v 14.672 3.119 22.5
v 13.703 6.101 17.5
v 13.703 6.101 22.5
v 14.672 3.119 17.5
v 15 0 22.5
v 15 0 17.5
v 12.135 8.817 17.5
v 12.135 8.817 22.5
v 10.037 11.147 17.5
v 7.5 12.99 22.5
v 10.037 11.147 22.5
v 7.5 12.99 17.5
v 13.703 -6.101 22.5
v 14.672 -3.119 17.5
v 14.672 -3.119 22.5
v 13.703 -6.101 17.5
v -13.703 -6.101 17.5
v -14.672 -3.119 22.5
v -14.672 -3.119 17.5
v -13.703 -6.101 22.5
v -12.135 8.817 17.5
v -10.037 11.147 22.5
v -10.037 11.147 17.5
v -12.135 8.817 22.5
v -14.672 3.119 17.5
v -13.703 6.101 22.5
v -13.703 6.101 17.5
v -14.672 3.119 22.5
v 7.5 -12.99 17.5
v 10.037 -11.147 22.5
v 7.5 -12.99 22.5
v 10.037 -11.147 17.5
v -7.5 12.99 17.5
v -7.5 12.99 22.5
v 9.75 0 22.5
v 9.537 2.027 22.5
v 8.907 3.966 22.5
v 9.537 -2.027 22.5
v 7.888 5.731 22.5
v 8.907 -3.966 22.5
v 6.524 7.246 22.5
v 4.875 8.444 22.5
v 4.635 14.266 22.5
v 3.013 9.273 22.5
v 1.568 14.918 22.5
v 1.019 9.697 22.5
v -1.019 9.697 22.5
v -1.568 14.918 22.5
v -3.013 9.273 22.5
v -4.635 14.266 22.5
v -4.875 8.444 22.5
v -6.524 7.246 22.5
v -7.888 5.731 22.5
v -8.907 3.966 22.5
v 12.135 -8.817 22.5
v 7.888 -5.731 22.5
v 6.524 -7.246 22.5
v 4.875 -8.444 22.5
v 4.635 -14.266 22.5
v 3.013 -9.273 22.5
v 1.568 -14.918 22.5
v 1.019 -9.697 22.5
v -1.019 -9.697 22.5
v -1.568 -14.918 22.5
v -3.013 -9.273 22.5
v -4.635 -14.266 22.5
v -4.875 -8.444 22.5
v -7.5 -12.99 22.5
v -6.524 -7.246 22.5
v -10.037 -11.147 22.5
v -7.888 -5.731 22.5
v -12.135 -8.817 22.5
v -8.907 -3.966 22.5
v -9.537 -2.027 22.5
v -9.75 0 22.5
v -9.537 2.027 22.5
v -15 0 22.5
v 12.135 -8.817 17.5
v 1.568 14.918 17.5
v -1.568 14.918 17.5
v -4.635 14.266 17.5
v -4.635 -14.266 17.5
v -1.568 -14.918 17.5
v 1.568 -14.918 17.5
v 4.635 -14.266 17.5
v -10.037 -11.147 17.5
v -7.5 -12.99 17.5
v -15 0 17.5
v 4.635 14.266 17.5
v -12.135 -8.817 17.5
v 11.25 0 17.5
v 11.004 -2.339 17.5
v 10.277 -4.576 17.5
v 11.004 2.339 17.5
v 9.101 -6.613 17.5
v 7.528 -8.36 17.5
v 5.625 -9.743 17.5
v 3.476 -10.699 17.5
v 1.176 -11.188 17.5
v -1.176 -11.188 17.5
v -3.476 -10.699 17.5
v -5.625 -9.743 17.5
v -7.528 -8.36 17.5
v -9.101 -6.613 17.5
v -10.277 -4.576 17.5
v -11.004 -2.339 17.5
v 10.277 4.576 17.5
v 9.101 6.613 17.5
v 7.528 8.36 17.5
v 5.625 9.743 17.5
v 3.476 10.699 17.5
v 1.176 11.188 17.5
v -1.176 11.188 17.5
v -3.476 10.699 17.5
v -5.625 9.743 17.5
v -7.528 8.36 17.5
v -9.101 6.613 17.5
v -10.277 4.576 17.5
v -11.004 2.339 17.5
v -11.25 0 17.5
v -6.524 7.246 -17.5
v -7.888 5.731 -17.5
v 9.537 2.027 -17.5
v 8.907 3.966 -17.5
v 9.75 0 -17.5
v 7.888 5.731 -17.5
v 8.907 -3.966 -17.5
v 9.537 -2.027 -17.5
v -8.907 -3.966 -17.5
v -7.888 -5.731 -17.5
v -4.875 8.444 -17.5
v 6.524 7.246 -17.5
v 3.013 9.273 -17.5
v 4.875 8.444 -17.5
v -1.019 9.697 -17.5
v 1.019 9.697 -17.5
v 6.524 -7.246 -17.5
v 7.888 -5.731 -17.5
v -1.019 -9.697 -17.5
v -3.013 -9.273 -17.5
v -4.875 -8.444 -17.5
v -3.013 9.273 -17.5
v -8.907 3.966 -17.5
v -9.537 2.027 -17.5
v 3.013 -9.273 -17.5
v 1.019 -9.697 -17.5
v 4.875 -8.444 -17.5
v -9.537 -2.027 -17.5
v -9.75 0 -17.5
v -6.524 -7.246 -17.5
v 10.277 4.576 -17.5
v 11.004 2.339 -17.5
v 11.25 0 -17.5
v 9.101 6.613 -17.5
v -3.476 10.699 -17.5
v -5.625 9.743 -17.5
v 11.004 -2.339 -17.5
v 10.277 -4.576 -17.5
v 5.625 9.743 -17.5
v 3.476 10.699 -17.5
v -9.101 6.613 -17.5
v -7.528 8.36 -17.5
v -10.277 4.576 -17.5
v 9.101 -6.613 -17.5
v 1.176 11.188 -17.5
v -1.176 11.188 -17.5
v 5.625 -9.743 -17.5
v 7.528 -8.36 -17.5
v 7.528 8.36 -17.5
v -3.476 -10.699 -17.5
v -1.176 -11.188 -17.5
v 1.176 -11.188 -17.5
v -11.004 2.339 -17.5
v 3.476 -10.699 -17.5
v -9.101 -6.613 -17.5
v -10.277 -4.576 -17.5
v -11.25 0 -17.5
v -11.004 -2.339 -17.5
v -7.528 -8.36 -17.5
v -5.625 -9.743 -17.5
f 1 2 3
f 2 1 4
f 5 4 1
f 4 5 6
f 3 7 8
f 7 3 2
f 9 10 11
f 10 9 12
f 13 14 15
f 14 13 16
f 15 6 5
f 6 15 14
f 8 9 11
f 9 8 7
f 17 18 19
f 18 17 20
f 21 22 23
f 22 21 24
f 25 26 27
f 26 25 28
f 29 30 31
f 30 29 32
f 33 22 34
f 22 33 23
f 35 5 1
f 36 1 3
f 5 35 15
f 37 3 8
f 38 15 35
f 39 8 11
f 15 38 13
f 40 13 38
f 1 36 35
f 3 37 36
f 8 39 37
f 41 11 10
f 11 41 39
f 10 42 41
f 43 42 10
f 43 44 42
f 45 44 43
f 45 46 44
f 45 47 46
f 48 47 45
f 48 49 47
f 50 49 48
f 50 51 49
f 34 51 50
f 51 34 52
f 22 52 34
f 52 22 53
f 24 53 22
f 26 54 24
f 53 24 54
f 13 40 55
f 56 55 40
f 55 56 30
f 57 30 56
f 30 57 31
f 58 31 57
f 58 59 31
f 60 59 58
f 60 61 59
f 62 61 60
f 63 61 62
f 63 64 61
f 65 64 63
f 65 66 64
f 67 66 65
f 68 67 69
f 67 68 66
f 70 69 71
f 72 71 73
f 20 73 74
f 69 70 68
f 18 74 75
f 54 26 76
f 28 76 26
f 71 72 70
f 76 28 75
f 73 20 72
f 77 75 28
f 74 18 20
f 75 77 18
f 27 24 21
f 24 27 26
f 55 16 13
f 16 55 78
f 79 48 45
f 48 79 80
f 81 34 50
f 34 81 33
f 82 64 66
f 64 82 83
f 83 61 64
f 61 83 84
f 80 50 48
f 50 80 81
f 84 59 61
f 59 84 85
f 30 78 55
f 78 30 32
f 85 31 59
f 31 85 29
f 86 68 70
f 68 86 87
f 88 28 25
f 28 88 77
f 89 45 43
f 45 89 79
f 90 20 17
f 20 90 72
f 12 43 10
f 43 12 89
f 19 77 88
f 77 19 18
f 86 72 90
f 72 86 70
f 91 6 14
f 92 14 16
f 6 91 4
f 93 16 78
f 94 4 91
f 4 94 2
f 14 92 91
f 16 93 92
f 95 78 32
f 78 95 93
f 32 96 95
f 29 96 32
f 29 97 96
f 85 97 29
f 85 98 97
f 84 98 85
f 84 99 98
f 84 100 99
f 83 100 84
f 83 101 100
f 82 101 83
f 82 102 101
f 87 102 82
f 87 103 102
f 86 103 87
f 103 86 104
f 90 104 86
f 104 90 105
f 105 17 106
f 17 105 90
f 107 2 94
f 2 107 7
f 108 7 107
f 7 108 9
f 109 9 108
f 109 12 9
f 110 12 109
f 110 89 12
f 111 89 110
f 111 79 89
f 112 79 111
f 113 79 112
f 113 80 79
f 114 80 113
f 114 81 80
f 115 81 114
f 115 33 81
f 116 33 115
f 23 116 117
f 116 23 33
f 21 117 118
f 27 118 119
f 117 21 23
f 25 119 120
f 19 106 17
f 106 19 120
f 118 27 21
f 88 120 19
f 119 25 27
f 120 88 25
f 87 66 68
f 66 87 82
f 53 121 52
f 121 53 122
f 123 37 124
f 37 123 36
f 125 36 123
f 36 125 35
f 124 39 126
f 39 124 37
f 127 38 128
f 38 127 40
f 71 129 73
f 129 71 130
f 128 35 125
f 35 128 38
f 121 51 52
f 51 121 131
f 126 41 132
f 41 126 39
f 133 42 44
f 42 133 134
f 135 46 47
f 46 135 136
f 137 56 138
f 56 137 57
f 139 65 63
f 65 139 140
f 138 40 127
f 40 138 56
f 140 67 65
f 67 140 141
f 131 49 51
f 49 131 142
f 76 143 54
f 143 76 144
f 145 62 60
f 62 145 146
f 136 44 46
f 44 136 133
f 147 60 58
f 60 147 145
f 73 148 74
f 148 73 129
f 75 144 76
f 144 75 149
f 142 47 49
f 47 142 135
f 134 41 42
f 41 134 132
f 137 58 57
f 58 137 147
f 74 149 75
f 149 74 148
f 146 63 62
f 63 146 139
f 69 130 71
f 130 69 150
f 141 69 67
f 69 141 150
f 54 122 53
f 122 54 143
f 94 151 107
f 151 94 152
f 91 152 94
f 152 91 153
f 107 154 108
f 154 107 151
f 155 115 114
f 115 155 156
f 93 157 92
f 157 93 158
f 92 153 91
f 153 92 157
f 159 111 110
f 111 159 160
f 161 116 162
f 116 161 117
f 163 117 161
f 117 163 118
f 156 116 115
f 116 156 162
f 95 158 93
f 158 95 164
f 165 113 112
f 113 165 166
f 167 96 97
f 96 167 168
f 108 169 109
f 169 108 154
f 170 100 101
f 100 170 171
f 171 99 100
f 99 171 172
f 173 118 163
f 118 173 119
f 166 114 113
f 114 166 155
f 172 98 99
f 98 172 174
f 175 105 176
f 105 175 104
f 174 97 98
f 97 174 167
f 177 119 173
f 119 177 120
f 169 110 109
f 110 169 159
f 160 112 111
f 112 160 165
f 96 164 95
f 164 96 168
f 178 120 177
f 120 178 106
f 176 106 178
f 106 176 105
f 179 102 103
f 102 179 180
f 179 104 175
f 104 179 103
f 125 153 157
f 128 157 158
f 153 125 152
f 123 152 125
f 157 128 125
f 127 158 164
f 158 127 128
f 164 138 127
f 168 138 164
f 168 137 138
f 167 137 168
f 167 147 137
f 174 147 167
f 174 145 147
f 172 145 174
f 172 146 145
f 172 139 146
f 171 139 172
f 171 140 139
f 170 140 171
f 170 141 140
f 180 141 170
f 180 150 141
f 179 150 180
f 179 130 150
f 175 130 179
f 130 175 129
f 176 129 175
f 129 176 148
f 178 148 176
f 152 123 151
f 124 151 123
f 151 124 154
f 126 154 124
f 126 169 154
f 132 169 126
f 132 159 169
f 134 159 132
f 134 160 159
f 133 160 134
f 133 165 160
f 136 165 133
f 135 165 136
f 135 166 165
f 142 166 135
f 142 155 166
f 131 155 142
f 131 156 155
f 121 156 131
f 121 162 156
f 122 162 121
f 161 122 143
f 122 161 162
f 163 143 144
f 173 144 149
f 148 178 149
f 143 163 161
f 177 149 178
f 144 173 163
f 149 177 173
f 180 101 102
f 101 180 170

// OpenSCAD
ocular();

module top (){
    difference(){
        cylinder(d=30, h=5, center=true);
        cylinder(d=23-0.5-3, h=15, center=true);
        }
    }


module ocular(){
    translate([0, 0, 35/2+5/2])
    top();
    difference(){
        cylinder(d=23-0.5, h=35, center=true);
        cylinder(d=23-0.5-3, h=40, center=true);
    }
}
